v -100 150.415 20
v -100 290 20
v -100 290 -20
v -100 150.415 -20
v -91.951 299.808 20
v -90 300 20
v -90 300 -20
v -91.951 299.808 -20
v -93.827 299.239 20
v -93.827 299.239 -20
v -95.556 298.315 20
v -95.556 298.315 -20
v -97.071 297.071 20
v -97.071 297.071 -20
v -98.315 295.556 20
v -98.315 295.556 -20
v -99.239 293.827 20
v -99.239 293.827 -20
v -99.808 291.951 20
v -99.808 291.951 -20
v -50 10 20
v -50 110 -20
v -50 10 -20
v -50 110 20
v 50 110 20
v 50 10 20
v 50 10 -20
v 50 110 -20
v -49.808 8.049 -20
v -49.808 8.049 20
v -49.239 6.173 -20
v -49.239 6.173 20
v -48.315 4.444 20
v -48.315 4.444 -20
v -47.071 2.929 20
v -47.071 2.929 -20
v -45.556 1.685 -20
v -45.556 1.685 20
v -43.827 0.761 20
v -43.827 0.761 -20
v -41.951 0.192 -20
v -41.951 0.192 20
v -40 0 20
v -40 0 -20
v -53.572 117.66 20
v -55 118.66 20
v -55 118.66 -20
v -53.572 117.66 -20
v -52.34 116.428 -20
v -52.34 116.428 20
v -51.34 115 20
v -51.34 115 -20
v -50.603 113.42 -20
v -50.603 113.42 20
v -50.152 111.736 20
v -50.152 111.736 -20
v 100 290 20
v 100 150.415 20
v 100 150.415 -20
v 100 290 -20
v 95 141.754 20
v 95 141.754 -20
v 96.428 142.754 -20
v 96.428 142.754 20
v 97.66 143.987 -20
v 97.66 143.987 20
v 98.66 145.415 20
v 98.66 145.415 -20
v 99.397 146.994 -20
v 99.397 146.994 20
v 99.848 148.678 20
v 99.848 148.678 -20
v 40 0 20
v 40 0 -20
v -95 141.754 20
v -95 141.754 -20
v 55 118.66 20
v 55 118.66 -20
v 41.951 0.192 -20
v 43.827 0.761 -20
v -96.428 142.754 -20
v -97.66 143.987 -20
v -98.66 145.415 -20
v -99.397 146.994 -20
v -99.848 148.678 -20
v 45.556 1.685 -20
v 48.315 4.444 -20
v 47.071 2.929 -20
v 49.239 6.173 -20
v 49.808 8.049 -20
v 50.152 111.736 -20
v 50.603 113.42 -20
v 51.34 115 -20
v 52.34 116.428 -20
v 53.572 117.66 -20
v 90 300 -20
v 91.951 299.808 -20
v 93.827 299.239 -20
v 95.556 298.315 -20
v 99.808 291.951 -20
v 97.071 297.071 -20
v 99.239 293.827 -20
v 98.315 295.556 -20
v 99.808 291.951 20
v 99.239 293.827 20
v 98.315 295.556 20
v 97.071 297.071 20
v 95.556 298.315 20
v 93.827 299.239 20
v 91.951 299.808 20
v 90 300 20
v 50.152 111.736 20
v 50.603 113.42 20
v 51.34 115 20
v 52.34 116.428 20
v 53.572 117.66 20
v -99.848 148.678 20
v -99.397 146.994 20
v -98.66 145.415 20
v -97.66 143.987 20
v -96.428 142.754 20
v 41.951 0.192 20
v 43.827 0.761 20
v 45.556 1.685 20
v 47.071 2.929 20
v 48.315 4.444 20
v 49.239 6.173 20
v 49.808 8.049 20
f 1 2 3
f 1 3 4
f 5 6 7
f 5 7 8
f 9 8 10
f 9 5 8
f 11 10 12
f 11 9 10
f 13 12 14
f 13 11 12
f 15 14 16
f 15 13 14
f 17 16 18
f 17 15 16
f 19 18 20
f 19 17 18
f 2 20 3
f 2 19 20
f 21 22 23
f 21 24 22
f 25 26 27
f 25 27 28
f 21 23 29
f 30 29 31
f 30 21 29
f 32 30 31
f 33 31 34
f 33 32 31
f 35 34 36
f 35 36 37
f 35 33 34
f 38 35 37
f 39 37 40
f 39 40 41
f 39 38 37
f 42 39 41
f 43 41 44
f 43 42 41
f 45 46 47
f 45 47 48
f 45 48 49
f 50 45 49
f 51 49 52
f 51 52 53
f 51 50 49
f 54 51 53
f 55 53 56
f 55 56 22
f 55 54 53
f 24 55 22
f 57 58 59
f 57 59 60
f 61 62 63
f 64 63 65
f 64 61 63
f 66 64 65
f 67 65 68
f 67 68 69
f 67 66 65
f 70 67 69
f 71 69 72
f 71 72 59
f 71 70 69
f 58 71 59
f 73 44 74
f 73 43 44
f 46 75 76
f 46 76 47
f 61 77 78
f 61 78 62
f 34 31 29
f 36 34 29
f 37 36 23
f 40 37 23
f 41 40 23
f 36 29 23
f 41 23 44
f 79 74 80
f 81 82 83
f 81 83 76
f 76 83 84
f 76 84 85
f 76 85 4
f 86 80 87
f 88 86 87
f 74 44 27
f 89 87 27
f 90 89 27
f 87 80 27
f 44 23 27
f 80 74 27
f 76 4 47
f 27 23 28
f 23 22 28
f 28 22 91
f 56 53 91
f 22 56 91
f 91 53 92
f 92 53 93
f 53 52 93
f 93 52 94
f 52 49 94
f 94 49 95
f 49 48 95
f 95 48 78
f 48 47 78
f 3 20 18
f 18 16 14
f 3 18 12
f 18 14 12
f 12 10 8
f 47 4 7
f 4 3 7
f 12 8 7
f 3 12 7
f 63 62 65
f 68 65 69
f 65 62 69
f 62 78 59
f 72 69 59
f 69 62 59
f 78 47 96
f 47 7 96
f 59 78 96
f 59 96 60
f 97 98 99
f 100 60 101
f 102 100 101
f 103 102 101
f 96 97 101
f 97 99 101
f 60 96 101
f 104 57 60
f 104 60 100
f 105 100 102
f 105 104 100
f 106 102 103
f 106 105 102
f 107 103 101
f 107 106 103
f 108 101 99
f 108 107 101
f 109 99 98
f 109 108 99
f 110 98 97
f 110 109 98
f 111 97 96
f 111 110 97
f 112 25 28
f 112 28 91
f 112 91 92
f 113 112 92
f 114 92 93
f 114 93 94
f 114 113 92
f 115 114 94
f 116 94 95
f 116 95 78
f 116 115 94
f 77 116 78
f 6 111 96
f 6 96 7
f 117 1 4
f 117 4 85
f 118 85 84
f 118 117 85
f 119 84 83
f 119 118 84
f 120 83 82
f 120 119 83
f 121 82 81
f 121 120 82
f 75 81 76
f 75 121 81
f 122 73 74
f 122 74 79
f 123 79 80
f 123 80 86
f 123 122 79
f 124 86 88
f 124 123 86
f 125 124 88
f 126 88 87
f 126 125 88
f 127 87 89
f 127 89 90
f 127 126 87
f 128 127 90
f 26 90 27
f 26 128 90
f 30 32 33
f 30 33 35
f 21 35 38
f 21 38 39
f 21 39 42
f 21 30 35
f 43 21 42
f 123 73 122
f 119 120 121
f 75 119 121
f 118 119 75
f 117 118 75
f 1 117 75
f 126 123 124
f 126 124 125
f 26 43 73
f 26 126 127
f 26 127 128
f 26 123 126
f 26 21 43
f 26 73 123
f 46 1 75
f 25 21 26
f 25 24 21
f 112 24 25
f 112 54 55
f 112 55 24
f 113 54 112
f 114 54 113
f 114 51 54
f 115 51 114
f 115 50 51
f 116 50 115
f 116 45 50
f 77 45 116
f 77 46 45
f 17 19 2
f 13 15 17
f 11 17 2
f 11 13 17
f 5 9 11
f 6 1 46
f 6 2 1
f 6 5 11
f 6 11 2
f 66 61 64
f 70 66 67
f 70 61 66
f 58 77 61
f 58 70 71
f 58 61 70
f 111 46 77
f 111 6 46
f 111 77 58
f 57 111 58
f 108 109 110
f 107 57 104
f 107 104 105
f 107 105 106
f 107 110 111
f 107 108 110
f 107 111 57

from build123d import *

# Parameters (mm, degrees)
RESSALTO_EXTRUS_O1_DEPTH = 20


with BuildPart() as part:
    # Esboço1 → Ressalto-extrusão1 (new body, symmetric)
    with BuildSketch(Plane.XY):
        with BuildLine():
            Line((-40, 0), (40, 0))
            ThreePointArc((40, 0), (47.071067812, 2.928932188), (50, 10))
            Line((50, 10), (50, 110))
            ThreePointArc((50, 110), (51.339745962, 115), (55, 118.660254038))
            Line((55, 118.660254038), (95, 141.754264805))
            ThreePointArc((95, 141.754264805), (98.660254038, 145.414518843), (100, 150.414518843))
            Line((100, 150.414518843), (100, 290))
            ThreePointArc((100, 290), (97.071067812, 297.071067812), (90, 300))
            Line((90, 300), (-90, 300))
            ThreePointArc((-90, 300), (-97.071067812, 297.071067812), (-100, 290))
            Line((-100, 290), (-100, 150.414518843))
            ThreePointArc((-100, 150.414518843), (-98.660254038, 145.414518843), (-95, 141.754264805))
            Line((-95, 141.754264805), (-55, 118.660254038))
            ThreePointArc((-55, 118.660254038), (-51.339745962, 115), (-50, 110))
            Line((-50, 110), (-50, 10))
            ThreePointArc((-50, 10), (-47.071067812, 2.928932188), (-40, 0))
        make_face()
    extrude(amount=RESSALTO_EXTRUS_O1_DEPTH, both=True)


solid = part.part
